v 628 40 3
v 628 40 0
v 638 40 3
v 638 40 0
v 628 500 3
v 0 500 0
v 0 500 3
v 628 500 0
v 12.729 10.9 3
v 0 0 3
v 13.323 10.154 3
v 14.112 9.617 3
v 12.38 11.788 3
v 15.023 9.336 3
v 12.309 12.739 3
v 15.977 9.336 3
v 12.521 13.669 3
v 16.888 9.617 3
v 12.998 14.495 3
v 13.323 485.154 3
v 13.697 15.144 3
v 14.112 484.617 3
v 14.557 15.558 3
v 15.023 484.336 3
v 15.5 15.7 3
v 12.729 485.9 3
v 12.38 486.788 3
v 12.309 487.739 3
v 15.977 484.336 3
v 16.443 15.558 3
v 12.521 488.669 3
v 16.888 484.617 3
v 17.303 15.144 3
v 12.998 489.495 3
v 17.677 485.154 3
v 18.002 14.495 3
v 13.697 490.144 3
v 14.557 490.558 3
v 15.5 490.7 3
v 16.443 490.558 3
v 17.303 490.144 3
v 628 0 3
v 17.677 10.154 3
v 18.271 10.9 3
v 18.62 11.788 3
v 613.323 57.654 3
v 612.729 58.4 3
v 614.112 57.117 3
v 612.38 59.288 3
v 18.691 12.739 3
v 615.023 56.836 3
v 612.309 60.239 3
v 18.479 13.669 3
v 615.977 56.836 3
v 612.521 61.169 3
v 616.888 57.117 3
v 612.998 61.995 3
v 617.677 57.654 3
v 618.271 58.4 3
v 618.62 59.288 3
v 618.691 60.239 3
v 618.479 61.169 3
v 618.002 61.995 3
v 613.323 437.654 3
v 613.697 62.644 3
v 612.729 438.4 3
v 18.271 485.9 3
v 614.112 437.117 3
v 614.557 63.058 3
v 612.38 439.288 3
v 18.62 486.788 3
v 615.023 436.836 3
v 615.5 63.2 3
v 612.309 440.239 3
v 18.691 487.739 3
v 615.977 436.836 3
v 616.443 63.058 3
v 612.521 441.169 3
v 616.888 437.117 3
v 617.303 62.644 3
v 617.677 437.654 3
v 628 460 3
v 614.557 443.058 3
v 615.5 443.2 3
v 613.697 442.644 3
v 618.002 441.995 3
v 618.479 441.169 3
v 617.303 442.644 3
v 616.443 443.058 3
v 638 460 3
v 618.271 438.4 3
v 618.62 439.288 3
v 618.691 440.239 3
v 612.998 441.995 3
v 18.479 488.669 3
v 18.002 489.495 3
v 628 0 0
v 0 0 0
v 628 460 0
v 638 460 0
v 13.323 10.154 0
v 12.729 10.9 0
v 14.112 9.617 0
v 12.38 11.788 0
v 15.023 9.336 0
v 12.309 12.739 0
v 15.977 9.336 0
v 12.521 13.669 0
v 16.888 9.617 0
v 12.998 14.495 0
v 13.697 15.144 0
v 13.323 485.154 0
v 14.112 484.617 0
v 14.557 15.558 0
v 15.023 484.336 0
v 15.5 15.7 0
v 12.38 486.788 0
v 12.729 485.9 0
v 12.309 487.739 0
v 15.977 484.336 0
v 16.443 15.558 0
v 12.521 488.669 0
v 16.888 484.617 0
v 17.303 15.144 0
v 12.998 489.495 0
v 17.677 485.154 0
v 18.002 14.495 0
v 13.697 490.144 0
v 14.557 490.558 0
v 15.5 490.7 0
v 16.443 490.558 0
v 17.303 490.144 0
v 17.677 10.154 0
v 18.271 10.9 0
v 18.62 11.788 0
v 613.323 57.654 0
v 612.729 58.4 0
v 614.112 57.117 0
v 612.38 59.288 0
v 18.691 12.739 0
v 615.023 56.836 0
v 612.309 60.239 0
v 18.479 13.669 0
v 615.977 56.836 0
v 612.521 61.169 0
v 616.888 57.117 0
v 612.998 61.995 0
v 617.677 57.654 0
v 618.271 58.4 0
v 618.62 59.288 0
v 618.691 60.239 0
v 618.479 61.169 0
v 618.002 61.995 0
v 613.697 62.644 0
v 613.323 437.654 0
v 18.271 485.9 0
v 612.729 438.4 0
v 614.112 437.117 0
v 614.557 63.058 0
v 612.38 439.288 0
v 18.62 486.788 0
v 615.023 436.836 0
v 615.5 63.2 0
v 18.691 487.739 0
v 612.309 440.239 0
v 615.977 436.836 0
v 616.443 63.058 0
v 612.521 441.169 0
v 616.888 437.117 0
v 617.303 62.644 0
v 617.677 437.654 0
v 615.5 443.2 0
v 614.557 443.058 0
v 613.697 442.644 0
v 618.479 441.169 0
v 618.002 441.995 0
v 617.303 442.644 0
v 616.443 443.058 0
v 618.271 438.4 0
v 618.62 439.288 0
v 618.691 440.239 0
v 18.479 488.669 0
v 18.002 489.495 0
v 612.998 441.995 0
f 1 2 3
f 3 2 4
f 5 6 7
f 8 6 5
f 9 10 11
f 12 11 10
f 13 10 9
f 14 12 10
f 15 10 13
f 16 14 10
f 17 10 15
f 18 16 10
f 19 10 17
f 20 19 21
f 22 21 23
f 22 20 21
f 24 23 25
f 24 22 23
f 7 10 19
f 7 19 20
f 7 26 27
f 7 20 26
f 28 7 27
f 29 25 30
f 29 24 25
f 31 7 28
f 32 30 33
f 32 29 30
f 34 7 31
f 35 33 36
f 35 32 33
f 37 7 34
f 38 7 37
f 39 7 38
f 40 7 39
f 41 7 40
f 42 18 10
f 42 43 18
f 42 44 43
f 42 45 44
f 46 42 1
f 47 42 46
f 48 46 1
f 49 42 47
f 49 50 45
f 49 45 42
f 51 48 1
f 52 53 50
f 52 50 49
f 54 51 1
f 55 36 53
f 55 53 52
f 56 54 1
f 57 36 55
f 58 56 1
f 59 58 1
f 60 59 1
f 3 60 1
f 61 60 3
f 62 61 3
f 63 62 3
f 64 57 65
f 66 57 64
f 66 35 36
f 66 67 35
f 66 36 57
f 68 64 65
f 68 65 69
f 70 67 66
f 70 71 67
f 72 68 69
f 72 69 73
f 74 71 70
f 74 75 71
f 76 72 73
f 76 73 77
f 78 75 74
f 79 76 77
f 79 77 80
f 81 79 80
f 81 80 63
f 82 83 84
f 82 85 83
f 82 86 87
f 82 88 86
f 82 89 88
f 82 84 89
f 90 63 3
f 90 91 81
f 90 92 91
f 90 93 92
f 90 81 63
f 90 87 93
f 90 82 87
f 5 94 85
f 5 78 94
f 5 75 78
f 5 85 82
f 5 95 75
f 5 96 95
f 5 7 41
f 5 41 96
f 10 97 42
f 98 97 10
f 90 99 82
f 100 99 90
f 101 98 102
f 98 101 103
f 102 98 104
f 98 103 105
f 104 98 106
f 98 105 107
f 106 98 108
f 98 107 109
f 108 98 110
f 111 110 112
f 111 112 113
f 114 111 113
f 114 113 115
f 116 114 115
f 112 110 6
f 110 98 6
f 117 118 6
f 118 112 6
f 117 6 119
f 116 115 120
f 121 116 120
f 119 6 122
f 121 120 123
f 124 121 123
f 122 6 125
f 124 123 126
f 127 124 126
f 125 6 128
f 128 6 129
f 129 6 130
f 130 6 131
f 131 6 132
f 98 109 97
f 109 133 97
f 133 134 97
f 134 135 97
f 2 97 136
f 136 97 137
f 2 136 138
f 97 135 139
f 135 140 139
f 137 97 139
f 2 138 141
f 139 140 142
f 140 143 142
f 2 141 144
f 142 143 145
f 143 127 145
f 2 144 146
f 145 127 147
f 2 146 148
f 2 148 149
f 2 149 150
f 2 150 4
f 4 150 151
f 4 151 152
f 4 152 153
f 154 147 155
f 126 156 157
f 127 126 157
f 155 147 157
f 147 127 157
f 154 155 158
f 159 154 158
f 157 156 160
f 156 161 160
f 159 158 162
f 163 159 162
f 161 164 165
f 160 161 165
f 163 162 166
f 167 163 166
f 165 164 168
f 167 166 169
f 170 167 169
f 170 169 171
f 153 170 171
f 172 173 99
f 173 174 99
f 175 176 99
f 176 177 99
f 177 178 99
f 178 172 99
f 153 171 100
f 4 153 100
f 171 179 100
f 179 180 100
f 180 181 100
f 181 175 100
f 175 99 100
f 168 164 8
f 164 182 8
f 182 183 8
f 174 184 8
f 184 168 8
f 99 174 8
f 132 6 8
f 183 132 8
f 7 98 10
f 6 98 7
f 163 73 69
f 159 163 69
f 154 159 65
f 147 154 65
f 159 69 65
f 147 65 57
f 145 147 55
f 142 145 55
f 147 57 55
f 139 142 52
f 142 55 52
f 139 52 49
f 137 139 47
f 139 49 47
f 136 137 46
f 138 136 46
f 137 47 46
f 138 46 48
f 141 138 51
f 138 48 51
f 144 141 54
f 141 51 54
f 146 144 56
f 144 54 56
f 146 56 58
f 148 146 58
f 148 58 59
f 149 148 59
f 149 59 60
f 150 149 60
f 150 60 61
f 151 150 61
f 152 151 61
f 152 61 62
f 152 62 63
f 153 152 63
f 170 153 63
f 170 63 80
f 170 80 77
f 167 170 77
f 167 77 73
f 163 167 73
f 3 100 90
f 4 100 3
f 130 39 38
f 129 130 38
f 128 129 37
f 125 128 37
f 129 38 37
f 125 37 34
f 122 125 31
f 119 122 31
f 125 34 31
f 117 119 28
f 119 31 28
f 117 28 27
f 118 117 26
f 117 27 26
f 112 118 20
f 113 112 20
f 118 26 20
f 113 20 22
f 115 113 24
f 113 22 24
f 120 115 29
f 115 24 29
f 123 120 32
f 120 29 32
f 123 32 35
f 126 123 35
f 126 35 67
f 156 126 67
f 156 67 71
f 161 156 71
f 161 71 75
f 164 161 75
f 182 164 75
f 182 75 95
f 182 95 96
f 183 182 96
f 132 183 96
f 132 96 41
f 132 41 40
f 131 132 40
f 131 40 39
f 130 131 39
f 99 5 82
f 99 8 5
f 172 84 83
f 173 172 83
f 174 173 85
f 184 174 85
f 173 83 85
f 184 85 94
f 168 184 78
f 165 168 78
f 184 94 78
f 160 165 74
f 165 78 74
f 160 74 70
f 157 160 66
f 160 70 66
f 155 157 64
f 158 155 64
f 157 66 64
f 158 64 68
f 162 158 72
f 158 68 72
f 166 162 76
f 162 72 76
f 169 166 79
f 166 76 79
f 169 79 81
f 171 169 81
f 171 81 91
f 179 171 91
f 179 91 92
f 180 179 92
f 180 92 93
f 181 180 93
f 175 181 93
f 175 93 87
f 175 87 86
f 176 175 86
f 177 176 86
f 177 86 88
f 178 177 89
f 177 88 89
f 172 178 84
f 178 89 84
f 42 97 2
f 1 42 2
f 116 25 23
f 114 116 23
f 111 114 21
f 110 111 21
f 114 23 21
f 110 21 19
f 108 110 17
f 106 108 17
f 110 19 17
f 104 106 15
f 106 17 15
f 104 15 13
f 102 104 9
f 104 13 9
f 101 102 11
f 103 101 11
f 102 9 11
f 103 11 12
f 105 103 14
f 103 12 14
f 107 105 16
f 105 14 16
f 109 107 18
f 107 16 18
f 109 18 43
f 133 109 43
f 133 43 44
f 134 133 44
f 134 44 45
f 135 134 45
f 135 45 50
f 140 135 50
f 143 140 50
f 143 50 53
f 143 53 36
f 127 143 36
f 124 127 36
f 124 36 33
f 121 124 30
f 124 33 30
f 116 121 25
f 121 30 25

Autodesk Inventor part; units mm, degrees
ref_plane "YZ Plane" through (0, 0, 0) normal (1, 0, 0) x (0, 1, 0)
ref_plane "XZ Plane" through (0, 0, 0) normal (0, 1, 0) x (-1, 0, 0)
ref_plane "XY Plane" through (0, 0, 0) normal (0, 0, 1) x (1, 0, 0)
sketch "Sketch1" plane through (0, 0, 0) normal (0, 0, 1) x (1, 0, 0)
  line L0 (638, 0) -> (0, 0)
  line L1 (0, 0) -> (0, 500)
  line L2 (0, 500) -> (638, 500)
  line L3 (638, 500) -> (638, 0)
  line L4 (615.5, 493.1922) -> (615.5, 30.4656) construction
  line L5 (15.5, 487.5) -> (15.5, 12.5) construction
  line L6 (638, 500) -> (615.5, 500)
  line L7 (638, 460) -> (638, 500)
  line L8 (638, 0) -> (615.5, 0)
  line L9 (638, 40) -> (638, 0)
  line L10 (638, 500) -> (628, 500)
  line L11 (628, 500) -> (628, 460)
  line L12 (628, 460) -> (638, 460)
  line L13 (638, 460) -> (638, 500)
  line L14 (638, 0) -> (628, 0)
  line L15 (628, 0) -> (628, 40)
  line L16 (628, 40) -> (638, 40)
  line L17 (638, 40) -> (638, 0)
  point P0 (615.5, 60)
  point P1 (615.5, 440)
  point P2 (615.5, 40)
  dimension "d2" = 638
  dimension "d3" = 500
  dimension "d10" = 22.5
  dimension "d11" = 15.5
  dimension "d12" = 12.5
  dimension "d13" = 12.5
  dimension "d14" = 60
  dimension "d15" = 60
  dimension "d29" = 10
extrude "Extrusion1" add sketch "Sketch1" along normal blind 3
hole "Hole1" at (615.5, 60, 0) at (615.5, 440, 0) at (15.5, 487.5, 0) at (15.5, 12.5, 0) direction (0, 0, 1) diameter 6.4 end through all
extrude "Extrusion3" cut sketch "Sketch1" along normal through all contours L0 L15 L16 L3 | L12 L11 L2 L3
properties part number "right_wall"
